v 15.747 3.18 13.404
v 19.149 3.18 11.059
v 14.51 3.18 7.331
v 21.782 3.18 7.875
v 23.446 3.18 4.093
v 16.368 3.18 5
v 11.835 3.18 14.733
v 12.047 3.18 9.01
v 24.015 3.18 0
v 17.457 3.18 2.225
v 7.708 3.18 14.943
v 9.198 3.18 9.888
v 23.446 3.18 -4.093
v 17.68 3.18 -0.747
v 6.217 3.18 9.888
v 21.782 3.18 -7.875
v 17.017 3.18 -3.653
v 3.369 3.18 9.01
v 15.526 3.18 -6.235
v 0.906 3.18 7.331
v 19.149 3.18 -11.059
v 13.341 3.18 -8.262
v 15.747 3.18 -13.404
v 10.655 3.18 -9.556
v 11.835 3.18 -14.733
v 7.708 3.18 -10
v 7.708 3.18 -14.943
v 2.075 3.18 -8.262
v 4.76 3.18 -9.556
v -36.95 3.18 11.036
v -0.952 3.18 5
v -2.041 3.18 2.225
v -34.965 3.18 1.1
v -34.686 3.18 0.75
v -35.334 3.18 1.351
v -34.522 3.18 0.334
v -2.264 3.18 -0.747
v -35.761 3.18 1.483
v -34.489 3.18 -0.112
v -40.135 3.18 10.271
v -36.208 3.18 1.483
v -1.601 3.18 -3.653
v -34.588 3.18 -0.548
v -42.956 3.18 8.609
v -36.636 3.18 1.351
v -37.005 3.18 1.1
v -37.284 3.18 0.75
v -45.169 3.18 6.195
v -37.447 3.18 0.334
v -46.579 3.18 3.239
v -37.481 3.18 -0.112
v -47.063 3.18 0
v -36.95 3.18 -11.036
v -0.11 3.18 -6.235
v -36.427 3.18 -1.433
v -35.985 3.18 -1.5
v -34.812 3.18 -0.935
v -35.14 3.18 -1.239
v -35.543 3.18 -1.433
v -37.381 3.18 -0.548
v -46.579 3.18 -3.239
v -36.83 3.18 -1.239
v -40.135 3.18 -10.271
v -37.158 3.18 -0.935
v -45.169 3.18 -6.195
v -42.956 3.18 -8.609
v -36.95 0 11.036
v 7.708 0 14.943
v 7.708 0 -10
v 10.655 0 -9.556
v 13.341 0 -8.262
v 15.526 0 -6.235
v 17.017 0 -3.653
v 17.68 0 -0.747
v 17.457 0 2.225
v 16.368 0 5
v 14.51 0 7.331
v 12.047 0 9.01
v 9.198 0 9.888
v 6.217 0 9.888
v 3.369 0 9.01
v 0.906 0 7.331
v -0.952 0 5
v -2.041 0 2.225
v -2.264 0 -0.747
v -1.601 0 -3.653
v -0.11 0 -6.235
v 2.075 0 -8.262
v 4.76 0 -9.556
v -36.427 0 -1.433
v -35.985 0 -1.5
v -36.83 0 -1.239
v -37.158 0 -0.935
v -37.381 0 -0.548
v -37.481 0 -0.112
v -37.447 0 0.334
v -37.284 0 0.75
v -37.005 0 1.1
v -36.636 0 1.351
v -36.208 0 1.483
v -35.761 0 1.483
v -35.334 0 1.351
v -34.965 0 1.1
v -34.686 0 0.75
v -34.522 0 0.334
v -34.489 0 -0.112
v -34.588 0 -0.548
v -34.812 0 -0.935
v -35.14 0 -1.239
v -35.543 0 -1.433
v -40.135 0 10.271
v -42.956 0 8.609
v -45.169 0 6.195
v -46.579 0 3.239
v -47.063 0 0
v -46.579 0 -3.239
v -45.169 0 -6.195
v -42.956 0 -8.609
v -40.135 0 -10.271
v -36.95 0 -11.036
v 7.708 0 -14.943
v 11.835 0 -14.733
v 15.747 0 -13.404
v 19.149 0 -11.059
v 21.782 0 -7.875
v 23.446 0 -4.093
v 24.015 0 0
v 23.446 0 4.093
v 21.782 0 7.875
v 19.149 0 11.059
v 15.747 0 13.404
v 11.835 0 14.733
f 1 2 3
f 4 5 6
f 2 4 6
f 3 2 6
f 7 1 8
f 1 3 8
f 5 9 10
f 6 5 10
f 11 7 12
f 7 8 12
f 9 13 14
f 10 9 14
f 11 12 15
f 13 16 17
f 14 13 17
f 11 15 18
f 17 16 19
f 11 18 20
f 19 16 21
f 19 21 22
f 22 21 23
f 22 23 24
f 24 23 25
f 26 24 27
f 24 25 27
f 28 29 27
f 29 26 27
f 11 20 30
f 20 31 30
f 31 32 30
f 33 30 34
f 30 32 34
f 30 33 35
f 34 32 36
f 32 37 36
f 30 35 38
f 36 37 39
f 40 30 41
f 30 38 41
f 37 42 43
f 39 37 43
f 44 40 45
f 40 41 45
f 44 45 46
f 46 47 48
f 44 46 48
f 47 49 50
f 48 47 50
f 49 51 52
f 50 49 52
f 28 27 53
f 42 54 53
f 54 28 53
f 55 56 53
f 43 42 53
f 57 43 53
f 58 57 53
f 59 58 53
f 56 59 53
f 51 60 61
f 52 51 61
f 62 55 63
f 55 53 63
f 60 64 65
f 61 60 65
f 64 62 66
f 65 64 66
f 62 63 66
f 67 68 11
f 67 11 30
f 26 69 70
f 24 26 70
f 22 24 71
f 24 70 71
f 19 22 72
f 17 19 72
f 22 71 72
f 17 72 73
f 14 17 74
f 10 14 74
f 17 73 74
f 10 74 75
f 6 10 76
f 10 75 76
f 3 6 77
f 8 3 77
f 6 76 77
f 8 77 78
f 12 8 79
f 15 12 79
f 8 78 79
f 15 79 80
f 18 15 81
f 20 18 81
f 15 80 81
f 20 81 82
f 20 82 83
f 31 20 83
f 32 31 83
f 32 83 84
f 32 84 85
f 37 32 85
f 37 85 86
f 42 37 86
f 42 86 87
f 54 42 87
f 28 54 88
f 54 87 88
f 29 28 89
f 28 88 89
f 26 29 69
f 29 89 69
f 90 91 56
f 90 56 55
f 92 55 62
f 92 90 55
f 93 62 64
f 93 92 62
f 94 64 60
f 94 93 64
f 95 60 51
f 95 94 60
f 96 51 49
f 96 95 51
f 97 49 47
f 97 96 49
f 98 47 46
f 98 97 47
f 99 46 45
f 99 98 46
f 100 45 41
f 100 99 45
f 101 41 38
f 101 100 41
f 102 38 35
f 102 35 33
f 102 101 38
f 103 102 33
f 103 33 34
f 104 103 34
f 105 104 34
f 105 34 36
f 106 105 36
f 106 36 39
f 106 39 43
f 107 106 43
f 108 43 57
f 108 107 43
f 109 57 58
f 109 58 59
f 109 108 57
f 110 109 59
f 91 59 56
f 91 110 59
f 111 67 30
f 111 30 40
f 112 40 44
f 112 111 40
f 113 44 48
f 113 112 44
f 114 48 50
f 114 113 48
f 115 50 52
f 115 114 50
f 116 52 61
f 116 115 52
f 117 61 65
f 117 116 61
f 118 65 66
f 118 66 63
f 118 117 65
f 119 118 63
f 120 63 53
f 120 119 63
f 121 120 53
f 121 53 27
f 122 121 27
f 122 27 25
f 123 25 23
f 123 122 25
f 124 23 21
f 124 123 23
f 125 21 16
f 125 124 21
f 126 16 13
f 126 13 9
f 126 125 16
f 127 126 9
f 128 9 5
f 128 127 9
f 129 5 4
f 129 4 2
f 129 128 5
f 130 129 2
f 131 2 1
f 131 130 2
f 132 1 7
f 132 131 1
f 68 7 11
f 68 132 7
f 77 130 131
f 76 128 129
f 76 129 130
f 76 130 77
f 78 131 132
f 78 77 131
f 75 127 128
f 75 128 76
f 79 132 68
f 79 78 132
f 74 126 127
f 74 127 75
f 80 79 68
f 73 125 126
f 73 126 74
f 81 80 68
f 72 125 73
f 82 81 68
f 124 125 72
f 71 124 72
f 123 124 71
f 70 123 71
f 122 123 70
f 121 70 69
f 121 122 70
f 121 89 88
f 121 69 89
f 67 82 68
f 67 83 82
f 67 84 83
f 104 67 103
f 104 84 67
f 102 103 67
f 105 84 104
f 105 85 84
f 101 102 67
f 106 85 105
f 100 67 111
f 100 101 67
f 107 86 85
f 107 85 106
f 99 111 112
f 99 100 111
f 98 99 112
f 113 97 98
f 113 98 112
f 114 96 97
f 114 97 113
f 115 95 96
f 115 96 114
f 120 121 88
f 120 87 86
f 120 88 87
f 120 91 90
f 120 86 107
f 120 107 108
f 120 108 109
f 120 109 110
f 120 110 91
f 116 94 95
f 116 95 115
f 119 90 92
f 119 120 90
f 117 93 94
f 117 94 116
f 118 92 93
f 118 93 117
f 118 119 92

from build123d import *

# Parameters (mm, degrees)
SKETCH1_R           = 1.5
BOSS_EXTRUDE1_DEPTH = 3.18
SKETCH2_R           = 10
CUT_EXTRUDE1_DEPTH  = 3.18


with BuildPart() as part:
    # Sketch1 → Boss-Extrude1 (new body)
    with BuildSketch(Plane(origin=(0, 0, 0), x_dir=(1, 0, 0), z_dir=(0, 1, 0))):
        with BuildLine():
            Line((-36.950288588, 11.035836474), (7.707885855, 14.942920471))
            ThreePointArc((7.707885855, 14.942920471), (24.015221996, 0), (7.707885855, -14.942920471))
            Line((7.707885855, -14.942920471), (-36.950288588, -11.035836474))
            ThreePointArc((-36.950288588, -11.035836474), (-47.062769581, 0), (-36.950288588, 11.035836474))
        make_face()
        with Locations(Location((-35.984778004, 0, 0), (0, 0, 90))):
            Circle(SKETCH1_R, mode=Mode.SUBTRACT)
    extrude(amount=BOSS_EXTRUDE1_DEPTH)

    # Sketch2 → Cut-Extrude1 (cut)
    with BuildSketch(Plane.XZ):
        with Locations(Location((7.707885855, 0, 0), (0, 0, 270))):
            Circle(SKETCH2_R)
    extrude(amount=-CUT_EXTRUDE1_DEPTH, mode=Mode.SUBTRACT)


solid = part.part
